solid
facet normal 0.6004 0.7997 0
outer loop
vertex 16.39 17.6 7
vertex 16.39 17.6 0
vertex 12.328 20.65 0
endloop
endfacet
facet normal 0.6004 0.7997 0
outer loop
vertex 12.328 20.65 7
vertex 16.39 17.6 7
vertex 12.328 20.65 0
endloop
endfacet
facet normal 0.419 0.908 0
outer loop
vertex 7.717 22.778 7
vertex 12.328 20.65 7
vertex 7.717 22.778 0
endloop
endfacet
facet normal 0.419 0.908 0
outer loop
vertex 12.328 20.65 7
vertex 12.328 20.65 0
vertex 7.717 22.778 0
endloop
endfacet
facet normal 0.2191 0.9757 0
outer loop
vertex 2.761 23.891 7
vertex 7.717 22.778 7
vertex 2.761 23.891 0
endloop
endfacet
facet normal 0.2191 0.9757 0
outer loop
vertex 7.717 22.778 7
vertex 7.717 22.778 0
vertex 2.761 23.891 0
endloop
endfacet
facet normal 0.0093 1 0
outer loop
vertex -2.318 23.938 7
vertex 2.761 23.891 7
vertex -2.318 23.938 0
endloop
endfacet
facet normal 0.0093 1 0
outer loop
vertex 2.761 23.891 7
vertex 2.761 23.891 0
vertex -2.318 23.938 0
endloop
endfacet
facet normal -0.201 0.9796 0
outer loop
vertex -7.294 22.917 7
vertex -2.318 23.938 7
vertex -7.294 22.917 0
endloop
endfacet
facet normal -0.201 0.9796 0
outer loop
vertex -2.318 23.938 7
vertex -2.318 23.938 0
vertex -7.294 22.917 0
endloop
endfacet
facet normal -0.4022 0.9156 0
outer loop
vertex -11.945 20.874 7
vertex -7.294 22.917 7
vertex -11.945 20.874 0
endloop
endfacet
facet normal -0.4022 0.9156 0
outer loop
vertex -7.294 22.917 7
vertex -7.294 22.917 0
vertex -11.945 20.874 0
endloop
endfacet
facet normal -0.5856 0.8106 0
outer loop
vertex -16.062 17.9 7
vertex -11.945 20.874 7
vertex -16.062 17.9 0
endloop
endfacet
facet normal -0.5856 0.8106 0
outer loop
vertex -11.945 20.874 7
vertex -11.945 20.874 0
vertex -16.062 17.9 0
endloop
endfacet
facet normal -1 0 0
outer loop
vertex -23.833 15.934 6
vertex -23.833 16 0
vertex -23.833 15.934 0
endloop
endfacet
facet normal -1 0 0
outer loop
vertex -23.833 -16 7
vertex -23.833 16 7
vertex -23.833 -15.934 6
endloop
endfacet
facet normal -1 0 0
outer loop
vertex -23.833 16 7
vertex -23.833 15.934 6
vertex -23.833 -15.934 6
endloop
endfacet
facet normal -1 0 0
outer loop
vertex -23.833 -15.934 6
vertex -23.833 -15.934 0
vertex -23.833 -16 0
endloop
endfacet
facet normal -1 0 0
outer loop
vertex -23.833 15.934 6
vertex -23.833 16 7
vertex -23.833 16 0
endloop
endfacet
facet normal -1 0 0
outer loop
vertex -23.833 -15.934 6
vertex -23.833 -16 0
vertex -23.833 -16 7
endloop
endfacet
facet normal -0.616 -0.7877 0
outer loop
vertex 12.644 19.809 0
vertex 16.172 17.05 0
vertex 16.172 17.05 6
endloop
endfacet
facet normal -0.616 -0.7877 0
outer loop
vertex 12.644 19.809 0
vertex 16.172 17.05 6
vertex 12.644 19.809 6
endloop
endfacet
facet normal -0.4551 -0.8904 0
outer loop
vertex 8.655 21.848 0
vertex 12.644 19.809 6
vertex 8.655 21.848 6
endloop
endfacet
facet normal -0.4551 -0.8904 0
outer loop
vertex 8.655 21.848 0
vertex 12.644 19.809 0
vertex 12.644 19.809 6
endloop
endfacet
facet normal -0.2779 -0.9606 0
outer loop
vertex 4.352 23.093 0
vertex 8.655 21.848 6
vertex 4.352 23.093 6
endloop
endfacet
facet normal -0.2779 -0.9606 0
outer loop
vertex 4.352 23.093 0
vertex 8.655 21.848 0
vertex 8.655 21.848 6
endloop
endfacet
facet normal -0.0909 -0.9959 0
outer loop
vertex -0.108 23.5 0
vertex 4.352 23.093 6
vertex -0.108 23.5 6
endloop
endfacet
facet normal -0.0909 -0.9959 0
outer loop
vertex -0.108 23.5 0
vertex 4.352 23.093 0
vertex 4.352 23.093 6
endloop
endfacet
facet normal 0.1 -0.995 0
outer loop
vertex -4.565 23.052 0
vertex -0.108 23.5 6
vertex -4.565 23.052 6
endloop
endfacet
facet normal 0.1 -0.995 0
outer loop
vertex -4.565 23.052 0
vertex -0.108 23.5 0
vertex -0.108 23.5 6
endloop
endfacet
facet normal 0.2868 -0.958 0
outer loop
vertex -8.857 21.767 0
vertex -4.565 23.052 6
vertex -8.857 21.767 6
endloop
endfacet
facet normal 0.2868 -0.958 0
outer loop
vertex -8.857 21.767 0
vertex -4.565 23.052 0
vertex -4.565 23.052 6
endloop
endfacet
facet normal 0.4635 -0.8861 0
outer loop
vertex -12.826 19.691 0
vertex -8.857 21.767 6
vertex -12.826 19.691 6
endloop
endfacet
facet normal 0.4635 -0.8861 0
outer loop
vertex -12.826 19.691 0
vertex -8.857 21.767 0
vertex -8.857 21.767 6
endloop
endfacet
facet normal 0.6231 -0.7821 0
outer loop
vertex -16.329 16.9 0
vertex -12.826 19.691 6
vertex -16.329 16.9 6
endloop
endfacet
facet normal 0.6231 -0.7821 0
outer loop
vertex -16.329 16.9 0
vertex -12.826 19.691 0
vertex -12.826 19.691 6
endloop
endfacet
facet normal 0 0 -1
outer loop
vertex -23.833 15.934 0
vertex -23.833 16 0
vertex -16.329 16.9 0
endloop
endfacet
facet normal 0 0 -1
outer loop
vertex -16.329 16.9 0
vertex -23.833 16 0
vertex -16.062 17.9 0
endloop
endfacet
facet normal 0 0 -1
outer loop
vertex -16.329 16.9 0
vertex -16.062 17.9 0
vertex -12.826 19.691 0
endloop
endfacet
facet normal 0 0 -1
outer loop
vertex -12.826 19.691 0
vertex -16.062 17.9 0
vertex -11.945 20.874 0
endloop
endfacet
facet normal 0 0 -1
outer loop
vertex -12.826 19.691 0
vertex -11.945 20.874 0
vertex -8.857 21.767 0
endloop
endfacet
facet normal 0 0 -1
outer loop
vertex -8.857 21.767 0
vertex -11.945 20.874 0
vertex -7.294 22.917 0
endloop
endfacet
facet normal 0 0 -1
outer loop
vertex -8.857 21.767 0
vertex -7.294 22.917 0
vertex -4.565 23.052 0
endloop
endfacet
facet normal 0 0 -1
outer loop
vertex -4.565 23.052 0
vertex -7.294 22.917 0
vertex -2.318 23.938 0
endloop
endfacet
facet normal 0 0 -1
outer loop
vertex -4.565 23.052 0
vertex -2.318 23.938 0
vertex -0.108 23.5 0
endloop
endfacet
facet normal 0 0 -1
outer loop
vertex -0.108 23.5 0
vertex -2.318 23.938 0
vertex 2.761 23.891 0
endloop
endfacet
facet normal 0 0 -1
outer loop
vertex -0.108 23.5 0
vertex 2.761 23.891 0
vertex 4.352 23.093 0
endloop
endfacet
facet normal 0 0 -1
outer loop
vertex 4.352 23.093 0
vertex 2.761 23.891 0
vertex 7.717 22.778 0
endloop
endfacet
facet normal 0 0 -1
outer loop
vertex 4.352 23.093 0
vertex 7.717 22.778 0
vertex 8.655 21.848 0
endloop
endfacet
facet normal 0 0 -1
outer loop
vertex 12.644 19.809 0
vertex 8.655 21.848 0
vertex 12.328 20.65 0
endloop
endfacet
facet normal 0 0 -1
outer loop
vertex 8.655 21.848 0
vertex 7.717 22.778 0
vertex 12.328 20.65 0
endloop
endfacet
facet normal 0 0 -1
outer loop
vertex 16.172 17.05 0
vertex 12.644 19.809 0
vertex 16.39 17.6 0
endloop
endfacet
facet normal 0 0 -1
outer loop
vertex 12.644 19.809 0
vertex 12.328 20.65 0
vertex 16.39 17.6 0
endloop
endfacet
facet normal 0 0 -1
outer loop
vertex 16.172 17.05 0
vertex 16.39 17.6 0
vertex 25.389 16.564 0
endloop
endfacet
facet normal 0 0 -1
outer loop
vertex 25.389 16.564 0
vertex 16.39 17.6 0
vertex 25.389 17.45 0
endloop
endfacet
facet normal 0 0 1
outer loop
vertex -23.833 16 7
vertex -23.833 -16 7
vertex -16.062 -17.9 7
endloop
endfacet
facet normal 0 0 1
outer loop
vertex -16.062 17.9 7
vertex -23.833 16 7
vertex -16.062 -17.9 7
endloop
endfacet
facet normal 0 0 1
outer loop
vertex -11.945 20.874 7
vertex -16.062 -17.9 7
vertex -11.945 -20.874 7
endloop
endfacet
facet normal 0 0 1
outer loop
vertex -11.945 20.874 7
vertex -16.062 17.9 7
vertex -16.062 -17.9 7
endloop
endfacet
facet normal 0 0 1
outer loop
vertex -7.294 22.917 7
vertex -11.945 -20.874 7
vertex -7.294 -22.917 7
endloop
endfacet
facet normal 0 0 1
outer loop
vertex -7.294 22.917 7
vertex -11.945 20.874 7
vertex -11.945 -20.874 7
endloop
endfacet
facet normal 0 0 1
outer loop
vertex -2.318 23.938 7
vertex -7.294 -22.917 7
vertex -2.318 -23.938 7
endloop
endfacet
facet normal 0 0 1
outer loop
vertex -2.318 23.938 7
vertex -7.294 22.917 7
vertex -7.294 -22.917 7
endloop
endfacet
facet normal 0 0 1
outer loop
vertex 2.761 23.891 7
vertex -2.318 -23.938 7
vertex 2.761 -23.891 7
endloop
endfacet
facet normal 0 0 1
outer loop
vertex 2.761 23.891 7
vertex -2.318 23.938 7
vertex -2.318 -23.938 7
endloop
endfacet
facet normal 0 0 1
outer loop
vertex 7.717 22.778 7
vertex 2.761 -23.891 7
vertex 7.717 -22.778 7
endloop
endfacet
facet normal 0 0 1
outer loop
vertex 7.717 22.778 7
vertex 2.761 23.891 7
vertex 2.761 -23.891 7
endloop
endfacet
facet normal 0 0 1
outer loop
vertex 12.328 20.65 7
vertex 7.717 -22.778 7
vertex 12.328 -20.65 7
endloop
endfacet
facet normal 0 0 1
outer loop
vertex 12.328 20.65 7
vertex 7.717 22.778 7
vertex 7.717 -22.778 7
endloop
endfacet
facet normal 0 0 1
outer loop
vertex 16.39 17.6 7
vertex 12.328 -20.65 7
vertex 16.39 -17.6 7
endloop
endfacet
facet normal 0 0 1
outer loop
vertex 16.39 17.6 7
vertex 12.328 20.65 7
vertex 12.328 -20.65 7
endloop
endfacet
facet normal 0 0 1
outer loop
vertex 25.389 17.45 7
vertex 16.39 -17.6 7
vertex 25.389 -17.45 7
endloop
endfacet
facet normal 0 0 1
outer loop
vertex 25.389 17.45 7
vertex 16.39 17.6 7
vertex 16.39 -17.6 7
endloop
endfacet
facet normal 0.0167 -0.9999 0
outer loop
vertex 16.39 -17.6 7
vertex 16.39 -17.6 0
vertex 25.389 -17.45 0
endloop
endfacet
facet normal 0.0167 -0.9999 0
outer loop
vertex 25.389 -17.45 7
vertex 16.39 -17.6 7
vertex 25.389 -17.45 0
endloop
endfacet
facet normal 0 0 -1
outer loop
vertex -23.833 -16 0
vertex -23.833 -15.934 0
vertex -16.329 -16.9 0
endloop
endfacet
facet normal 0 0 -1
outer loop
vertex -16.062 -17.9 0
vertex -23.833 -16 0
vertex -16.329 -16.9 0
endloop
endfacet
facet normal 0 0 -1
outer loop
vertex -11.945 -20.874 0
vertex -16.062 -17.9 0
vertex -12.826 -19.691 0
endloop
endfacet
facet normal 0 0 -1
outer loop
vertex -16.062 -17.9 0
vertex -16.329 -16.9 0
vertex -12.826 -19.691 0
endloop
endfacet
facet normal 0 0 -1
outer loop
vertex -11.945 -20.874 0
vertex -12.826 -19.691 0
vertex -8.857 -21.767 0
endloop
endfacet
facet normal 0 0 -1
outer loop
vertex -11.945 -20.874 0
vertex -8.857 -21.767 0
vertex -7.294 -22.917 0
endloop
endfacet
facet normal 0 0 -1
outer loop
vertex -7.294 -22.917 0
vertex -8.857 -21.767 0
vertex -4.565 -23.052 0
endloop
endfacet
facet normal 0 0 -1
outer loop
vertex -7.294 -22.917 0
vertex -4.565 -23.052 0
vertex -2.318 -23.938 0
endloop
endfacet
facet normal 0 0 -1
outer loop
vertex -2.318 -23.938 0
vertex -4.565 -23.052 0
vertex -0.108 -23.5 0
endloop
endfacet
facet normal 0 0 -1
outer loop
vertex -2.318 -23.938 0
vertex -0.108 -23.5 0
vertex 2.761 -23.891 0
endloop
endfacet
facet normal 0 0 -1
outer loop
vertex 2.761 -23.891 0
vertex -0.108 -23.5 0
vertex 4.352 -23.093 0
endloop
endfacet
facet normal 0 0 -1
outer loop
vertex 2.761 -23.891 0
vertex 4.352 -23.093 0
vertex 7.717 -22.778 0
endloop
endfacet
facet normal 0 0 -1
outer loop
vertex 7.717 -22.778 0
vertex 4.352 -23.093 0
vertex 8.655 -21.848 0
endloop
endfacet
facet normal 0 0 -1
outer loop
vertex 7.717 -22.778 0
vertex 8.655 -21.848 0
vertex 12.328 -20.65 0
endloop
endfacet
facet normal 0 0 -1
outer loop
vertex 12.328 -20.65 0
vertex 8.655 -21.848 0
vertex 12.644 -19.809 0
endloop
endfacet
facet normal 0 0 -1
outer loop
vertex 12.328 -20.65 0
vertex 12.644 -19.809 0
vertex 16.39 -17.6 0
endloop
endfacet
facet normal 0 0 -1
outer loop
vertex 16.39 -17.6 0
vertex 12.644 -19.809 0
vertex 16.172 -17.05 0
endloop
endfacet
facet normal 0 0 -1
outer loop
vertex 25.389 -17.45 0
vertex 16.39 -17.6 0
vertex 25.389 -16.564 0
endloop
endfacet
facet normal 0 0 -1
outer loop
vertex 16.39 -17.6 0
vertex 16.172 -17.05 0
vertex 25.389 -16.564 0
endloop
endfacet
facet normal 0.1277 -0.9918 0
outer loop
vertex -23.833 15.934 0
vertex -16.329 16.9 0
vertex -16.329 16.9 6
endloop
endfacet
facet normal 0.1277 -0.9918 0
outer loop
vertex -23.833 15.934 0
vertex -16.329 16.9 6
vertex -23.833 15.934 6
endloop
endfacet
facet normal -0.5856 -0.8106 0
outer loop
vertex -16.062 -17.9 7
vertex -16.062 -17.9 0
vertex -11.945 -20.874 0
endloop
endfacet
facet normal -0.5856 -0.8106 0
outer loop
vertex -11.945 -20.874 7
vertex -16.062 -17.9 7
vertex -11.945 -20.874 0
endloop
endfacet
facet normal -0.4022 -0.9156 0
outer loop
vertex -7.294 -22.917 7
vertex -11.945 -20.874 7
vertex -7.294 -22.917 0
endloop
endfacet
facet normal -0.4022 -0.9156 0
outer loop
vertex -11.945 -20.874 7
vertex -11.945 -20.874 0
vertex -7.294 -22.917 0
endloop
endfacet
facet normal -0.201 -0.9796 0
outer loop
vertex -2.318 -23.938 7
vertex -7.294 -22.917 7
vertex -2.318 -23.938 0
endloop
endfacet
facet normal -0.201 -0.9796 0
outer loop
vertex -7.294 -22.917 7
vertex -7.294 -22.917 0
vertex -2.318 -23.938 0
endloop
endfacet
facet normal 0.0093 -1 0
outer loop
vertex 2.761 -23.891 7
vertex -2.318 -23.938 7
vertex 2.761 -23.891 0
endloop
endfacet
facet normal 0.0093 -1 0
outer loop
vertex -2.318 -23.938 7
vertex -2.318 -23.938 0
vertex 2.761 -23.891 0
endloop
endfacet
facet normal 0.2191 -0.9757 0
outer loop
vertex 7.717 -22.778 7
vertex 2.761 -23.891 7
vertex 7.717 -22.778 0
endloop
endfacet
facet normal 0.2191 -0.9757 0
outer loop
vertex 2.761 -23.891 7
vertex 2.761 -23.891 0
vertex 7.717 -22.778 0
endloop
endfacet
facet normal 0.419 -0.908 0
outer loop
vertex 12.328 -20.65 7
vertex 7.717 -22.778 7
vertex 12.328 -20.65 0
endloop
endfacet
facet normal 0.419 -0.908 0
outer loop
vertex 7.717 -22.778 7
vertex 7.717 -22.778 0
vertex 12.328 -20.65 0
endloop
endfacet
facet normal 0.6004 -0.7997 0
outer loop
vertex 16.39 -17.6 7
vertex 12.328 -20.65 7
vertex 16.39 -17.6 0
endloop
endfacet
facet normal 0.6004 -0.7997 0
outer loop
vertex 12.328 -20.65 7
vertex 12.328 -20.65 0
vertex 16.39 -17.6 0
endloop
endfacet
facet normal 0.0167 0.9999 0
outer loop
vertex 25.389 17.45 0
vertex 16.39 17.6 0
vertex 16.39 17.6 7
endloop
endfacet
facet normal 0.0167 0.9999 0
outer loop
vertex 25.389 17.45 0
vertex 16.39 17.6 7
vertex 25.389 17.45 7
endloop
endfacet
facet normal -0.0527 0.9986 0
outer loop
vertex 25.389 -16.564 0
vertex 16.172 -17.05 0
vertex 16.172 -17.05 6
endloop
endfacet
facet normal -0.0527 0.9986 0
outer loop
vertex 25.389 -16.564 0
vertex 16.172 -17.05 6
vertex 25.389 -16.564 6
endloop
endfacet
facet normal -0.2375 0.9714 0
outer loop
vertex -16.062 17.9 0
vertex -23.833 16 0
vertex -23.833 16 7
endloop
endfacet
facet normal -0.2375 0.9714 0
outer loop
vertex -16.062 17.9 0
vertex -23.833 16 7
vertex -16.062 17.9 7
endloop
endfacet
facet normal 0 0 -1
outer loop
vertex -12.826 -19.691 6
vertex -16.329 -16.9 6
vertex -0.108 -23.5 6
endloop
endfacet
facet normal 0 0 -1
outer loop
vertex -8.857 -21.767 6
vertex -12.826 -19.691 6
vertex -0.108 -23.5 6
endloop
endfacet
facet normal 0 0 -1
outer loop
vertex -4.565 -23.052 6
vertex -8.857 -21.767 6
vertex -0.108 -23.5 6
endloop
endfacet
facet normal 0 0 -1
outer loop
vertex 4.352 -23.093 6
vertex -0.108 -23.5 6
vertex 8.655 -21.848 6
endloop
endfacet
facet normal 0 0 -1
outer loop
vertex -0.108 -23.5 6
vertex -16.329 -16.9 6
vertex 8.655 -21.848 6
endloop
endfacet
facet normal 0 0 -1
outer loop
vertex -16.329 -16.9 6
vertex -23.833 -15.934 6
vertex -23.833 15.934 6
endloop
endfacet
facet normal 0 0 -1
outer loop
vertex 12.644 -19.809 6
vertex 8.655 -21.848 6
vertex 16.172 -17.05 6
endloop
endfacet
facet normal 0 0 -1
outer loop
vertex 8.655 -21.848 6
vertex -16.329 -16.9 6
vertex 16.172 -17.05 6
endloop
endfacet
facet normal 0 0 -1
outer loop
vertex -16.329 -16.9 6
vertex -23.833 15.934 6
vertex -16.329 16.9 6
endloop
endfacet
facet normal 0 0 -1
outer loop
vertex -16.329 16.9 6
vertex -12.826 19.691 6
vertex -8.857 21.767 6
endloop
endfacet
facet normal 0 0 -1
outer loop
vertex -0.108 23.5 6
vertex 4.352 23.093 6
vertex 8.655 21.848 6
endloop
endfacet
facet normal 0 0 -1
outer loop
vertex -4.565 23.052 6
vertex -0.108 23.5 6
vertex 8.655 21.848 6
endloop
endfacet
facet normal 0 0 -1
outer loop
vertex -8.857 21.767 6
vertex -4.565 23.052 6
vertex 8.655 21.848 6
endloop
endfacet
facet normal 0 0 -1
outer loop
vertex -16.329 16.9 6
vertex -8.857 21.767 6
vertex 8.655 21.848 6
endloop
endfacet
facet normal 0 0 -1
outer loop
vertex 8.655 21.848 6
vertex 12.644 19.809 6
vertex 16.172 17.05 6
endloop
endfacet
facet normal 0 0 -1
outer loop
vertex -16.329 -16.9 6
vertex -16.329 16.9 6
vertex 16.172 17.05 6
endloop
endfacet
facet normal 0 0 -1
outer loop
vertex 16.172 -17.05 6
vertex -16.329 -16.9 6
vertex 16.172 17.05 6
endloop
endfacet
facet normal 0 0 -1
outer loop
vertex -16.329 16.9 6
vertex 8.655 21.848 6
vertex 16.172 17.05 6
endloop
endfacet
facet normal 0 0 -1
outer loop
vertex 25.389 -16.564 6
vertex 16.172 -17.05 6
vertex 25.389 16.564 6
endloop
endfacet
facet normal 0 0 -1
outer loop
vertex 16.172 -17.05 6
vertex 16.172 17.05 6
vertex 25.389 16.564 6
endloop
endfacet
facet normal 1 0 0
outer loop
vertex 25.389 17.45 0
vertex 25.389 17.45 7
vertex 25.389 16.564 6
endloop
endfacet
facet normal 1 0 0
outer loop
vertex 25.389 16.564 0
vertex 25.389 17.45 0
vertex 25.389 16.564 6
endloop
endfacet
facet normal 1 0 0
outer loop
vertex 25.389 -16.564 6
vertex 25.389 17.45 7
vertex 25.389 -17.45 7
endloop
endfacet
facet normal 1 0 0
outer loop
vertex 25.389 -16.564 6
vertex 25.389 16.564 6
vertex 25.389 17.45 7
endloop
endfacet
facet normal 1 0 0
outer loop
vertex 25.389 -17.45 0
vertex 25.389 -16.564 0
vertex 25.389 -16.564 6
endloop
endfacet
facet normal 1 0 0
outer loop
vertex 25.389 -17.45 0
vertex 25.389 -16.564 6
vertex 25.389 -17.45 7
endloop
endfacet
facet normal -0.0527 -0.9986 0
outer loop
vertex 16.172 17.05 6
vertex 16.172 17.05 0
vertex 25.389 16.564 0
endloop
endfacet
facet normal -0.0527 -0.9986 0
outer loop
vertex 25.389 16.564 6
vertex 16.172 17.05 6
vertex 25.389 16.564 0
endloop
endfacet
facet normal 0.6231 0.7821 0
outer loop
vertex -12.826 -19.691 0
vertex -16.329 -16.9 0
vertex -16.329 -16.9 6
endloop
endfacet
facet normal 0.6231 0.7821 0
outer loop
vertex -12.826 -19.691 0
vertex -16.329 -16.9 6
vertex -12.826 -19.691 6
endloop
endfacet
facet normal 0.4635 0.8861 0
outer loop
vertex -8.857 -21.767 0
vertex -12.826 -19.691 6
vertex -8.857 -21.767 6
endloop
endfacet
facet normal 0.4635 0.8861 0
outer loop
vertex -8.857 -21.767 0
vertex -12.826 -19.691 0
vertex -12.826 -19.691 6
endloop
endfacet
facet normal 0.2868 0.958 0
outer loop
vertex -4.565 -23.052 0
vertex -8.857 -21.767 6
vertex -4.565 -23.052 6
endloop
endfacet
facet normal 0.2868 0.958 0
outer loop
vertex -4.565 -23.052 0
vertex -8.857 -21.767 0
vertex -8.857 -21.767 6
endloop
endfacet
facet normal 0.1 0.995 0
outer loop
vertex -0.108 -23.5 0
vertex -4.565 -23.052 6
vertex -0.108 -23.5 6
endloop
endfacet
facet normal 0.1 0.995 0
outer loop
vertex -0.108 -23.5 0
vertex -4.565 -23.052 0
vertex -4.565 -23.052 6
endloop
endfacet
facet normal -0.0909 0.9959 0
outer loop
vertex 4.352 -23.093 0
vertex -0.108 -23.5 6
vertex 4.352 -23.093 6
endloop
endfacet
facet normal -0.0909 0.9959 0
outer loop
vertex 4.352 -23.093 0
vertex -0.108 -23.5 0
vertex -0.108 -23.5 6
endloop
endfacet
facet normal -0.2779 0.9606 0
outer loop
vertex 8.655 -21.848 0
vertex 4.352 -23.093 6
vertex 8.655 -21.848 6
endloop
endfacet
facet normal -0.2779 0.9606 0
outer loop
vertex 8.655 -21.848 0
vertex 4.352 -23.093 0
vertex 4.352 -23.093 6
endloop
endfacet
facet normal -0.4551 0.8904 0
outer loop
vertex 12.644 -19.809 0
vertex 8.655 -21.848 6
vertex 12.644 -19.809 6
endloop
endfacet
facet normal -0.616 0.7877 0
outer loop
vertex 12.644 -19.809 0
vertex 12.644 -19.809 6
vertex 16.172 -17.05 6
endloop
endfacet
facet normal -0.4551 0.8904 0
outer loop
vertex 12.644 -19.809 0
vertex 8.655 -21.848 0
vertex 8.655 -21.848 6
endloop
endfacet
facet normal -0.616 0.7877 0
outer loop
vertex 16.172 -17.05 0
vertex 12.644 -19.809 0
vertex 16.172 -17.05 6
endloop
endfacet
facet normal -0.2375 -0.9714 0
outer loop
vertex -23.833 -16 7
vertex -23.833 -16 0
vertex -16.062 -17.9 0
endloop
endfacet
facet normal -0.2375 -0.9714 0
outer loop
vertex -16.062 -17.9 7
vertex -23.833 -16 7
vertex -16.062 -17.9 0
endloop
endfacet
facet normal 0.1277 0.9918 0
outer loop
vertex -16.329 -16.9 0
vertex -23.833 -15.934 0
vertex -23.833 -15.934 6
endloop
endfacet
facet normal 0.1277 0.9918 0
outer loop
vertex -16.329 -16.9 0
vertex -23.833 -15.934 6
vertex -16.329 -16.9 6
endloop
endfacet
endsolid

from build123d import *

# Parameters (mm, degrees)
PAD_DEPTH    = 7
POCKET_DEPTH = 6


with BuildPart() as part:
    # Sketch → Pad (new body)
    with BuildSketch(Plane.XY):
        with BuildLine():
            Line((-23.833245, 16), (-23.833245, -16))
            Line((-23.833245, -16), (-16.062145, -17.9))
            ThreePointArc((-16.062145, -17.9), (0.222316, -24.048972), (16.390317, -17.6))
            Line((16.390317, -17.6), (25.389067, -17.45))
            Line((25.389067, 17.45), (25.389067, -17.45))
            Line((16.390317, 17.6), (25.389067, 17.45))
            ThreePointArc((16.390317, 17.6), (0.222316, 24.048972), (-16.062145, 17.9))
            Line((-23.833245, 16), (-16.062145, 17.9))
        make_face()
    extrude(amount=PAD_DEPTH)

    # Sketch001 → Pocket (cut)
    with BuildSketch(Plane.XY):
        with BuildLine():
            Line((-16.329115, 16.9), (-25.652205, 15.7))
            Line((-25.652205, 15.7), (-25.652205, -15.7))
            Line((-25.652205, -15.7), (-16.329115, -16.9))
            ThreePointArc((-16.329115, -16.9), (-0.108455, -23.49975), (16.17243, -17.05))
            Line((16.17243, -17.05), (25.659263, -16.55))
            Line((25.659263, 16.55), (25.659263, -16.55))
            Line((16.17243, 17.05), (25.659263, 16.55))
            ThreePointArc((16.17243, 17.05), (-0.108455, 23.49975), (-16.329115, 16.9))
        make_face()
    extrude(amount=POCKET_DEPTH, mode=Mode.SUBTRACT)


solid = part.part
